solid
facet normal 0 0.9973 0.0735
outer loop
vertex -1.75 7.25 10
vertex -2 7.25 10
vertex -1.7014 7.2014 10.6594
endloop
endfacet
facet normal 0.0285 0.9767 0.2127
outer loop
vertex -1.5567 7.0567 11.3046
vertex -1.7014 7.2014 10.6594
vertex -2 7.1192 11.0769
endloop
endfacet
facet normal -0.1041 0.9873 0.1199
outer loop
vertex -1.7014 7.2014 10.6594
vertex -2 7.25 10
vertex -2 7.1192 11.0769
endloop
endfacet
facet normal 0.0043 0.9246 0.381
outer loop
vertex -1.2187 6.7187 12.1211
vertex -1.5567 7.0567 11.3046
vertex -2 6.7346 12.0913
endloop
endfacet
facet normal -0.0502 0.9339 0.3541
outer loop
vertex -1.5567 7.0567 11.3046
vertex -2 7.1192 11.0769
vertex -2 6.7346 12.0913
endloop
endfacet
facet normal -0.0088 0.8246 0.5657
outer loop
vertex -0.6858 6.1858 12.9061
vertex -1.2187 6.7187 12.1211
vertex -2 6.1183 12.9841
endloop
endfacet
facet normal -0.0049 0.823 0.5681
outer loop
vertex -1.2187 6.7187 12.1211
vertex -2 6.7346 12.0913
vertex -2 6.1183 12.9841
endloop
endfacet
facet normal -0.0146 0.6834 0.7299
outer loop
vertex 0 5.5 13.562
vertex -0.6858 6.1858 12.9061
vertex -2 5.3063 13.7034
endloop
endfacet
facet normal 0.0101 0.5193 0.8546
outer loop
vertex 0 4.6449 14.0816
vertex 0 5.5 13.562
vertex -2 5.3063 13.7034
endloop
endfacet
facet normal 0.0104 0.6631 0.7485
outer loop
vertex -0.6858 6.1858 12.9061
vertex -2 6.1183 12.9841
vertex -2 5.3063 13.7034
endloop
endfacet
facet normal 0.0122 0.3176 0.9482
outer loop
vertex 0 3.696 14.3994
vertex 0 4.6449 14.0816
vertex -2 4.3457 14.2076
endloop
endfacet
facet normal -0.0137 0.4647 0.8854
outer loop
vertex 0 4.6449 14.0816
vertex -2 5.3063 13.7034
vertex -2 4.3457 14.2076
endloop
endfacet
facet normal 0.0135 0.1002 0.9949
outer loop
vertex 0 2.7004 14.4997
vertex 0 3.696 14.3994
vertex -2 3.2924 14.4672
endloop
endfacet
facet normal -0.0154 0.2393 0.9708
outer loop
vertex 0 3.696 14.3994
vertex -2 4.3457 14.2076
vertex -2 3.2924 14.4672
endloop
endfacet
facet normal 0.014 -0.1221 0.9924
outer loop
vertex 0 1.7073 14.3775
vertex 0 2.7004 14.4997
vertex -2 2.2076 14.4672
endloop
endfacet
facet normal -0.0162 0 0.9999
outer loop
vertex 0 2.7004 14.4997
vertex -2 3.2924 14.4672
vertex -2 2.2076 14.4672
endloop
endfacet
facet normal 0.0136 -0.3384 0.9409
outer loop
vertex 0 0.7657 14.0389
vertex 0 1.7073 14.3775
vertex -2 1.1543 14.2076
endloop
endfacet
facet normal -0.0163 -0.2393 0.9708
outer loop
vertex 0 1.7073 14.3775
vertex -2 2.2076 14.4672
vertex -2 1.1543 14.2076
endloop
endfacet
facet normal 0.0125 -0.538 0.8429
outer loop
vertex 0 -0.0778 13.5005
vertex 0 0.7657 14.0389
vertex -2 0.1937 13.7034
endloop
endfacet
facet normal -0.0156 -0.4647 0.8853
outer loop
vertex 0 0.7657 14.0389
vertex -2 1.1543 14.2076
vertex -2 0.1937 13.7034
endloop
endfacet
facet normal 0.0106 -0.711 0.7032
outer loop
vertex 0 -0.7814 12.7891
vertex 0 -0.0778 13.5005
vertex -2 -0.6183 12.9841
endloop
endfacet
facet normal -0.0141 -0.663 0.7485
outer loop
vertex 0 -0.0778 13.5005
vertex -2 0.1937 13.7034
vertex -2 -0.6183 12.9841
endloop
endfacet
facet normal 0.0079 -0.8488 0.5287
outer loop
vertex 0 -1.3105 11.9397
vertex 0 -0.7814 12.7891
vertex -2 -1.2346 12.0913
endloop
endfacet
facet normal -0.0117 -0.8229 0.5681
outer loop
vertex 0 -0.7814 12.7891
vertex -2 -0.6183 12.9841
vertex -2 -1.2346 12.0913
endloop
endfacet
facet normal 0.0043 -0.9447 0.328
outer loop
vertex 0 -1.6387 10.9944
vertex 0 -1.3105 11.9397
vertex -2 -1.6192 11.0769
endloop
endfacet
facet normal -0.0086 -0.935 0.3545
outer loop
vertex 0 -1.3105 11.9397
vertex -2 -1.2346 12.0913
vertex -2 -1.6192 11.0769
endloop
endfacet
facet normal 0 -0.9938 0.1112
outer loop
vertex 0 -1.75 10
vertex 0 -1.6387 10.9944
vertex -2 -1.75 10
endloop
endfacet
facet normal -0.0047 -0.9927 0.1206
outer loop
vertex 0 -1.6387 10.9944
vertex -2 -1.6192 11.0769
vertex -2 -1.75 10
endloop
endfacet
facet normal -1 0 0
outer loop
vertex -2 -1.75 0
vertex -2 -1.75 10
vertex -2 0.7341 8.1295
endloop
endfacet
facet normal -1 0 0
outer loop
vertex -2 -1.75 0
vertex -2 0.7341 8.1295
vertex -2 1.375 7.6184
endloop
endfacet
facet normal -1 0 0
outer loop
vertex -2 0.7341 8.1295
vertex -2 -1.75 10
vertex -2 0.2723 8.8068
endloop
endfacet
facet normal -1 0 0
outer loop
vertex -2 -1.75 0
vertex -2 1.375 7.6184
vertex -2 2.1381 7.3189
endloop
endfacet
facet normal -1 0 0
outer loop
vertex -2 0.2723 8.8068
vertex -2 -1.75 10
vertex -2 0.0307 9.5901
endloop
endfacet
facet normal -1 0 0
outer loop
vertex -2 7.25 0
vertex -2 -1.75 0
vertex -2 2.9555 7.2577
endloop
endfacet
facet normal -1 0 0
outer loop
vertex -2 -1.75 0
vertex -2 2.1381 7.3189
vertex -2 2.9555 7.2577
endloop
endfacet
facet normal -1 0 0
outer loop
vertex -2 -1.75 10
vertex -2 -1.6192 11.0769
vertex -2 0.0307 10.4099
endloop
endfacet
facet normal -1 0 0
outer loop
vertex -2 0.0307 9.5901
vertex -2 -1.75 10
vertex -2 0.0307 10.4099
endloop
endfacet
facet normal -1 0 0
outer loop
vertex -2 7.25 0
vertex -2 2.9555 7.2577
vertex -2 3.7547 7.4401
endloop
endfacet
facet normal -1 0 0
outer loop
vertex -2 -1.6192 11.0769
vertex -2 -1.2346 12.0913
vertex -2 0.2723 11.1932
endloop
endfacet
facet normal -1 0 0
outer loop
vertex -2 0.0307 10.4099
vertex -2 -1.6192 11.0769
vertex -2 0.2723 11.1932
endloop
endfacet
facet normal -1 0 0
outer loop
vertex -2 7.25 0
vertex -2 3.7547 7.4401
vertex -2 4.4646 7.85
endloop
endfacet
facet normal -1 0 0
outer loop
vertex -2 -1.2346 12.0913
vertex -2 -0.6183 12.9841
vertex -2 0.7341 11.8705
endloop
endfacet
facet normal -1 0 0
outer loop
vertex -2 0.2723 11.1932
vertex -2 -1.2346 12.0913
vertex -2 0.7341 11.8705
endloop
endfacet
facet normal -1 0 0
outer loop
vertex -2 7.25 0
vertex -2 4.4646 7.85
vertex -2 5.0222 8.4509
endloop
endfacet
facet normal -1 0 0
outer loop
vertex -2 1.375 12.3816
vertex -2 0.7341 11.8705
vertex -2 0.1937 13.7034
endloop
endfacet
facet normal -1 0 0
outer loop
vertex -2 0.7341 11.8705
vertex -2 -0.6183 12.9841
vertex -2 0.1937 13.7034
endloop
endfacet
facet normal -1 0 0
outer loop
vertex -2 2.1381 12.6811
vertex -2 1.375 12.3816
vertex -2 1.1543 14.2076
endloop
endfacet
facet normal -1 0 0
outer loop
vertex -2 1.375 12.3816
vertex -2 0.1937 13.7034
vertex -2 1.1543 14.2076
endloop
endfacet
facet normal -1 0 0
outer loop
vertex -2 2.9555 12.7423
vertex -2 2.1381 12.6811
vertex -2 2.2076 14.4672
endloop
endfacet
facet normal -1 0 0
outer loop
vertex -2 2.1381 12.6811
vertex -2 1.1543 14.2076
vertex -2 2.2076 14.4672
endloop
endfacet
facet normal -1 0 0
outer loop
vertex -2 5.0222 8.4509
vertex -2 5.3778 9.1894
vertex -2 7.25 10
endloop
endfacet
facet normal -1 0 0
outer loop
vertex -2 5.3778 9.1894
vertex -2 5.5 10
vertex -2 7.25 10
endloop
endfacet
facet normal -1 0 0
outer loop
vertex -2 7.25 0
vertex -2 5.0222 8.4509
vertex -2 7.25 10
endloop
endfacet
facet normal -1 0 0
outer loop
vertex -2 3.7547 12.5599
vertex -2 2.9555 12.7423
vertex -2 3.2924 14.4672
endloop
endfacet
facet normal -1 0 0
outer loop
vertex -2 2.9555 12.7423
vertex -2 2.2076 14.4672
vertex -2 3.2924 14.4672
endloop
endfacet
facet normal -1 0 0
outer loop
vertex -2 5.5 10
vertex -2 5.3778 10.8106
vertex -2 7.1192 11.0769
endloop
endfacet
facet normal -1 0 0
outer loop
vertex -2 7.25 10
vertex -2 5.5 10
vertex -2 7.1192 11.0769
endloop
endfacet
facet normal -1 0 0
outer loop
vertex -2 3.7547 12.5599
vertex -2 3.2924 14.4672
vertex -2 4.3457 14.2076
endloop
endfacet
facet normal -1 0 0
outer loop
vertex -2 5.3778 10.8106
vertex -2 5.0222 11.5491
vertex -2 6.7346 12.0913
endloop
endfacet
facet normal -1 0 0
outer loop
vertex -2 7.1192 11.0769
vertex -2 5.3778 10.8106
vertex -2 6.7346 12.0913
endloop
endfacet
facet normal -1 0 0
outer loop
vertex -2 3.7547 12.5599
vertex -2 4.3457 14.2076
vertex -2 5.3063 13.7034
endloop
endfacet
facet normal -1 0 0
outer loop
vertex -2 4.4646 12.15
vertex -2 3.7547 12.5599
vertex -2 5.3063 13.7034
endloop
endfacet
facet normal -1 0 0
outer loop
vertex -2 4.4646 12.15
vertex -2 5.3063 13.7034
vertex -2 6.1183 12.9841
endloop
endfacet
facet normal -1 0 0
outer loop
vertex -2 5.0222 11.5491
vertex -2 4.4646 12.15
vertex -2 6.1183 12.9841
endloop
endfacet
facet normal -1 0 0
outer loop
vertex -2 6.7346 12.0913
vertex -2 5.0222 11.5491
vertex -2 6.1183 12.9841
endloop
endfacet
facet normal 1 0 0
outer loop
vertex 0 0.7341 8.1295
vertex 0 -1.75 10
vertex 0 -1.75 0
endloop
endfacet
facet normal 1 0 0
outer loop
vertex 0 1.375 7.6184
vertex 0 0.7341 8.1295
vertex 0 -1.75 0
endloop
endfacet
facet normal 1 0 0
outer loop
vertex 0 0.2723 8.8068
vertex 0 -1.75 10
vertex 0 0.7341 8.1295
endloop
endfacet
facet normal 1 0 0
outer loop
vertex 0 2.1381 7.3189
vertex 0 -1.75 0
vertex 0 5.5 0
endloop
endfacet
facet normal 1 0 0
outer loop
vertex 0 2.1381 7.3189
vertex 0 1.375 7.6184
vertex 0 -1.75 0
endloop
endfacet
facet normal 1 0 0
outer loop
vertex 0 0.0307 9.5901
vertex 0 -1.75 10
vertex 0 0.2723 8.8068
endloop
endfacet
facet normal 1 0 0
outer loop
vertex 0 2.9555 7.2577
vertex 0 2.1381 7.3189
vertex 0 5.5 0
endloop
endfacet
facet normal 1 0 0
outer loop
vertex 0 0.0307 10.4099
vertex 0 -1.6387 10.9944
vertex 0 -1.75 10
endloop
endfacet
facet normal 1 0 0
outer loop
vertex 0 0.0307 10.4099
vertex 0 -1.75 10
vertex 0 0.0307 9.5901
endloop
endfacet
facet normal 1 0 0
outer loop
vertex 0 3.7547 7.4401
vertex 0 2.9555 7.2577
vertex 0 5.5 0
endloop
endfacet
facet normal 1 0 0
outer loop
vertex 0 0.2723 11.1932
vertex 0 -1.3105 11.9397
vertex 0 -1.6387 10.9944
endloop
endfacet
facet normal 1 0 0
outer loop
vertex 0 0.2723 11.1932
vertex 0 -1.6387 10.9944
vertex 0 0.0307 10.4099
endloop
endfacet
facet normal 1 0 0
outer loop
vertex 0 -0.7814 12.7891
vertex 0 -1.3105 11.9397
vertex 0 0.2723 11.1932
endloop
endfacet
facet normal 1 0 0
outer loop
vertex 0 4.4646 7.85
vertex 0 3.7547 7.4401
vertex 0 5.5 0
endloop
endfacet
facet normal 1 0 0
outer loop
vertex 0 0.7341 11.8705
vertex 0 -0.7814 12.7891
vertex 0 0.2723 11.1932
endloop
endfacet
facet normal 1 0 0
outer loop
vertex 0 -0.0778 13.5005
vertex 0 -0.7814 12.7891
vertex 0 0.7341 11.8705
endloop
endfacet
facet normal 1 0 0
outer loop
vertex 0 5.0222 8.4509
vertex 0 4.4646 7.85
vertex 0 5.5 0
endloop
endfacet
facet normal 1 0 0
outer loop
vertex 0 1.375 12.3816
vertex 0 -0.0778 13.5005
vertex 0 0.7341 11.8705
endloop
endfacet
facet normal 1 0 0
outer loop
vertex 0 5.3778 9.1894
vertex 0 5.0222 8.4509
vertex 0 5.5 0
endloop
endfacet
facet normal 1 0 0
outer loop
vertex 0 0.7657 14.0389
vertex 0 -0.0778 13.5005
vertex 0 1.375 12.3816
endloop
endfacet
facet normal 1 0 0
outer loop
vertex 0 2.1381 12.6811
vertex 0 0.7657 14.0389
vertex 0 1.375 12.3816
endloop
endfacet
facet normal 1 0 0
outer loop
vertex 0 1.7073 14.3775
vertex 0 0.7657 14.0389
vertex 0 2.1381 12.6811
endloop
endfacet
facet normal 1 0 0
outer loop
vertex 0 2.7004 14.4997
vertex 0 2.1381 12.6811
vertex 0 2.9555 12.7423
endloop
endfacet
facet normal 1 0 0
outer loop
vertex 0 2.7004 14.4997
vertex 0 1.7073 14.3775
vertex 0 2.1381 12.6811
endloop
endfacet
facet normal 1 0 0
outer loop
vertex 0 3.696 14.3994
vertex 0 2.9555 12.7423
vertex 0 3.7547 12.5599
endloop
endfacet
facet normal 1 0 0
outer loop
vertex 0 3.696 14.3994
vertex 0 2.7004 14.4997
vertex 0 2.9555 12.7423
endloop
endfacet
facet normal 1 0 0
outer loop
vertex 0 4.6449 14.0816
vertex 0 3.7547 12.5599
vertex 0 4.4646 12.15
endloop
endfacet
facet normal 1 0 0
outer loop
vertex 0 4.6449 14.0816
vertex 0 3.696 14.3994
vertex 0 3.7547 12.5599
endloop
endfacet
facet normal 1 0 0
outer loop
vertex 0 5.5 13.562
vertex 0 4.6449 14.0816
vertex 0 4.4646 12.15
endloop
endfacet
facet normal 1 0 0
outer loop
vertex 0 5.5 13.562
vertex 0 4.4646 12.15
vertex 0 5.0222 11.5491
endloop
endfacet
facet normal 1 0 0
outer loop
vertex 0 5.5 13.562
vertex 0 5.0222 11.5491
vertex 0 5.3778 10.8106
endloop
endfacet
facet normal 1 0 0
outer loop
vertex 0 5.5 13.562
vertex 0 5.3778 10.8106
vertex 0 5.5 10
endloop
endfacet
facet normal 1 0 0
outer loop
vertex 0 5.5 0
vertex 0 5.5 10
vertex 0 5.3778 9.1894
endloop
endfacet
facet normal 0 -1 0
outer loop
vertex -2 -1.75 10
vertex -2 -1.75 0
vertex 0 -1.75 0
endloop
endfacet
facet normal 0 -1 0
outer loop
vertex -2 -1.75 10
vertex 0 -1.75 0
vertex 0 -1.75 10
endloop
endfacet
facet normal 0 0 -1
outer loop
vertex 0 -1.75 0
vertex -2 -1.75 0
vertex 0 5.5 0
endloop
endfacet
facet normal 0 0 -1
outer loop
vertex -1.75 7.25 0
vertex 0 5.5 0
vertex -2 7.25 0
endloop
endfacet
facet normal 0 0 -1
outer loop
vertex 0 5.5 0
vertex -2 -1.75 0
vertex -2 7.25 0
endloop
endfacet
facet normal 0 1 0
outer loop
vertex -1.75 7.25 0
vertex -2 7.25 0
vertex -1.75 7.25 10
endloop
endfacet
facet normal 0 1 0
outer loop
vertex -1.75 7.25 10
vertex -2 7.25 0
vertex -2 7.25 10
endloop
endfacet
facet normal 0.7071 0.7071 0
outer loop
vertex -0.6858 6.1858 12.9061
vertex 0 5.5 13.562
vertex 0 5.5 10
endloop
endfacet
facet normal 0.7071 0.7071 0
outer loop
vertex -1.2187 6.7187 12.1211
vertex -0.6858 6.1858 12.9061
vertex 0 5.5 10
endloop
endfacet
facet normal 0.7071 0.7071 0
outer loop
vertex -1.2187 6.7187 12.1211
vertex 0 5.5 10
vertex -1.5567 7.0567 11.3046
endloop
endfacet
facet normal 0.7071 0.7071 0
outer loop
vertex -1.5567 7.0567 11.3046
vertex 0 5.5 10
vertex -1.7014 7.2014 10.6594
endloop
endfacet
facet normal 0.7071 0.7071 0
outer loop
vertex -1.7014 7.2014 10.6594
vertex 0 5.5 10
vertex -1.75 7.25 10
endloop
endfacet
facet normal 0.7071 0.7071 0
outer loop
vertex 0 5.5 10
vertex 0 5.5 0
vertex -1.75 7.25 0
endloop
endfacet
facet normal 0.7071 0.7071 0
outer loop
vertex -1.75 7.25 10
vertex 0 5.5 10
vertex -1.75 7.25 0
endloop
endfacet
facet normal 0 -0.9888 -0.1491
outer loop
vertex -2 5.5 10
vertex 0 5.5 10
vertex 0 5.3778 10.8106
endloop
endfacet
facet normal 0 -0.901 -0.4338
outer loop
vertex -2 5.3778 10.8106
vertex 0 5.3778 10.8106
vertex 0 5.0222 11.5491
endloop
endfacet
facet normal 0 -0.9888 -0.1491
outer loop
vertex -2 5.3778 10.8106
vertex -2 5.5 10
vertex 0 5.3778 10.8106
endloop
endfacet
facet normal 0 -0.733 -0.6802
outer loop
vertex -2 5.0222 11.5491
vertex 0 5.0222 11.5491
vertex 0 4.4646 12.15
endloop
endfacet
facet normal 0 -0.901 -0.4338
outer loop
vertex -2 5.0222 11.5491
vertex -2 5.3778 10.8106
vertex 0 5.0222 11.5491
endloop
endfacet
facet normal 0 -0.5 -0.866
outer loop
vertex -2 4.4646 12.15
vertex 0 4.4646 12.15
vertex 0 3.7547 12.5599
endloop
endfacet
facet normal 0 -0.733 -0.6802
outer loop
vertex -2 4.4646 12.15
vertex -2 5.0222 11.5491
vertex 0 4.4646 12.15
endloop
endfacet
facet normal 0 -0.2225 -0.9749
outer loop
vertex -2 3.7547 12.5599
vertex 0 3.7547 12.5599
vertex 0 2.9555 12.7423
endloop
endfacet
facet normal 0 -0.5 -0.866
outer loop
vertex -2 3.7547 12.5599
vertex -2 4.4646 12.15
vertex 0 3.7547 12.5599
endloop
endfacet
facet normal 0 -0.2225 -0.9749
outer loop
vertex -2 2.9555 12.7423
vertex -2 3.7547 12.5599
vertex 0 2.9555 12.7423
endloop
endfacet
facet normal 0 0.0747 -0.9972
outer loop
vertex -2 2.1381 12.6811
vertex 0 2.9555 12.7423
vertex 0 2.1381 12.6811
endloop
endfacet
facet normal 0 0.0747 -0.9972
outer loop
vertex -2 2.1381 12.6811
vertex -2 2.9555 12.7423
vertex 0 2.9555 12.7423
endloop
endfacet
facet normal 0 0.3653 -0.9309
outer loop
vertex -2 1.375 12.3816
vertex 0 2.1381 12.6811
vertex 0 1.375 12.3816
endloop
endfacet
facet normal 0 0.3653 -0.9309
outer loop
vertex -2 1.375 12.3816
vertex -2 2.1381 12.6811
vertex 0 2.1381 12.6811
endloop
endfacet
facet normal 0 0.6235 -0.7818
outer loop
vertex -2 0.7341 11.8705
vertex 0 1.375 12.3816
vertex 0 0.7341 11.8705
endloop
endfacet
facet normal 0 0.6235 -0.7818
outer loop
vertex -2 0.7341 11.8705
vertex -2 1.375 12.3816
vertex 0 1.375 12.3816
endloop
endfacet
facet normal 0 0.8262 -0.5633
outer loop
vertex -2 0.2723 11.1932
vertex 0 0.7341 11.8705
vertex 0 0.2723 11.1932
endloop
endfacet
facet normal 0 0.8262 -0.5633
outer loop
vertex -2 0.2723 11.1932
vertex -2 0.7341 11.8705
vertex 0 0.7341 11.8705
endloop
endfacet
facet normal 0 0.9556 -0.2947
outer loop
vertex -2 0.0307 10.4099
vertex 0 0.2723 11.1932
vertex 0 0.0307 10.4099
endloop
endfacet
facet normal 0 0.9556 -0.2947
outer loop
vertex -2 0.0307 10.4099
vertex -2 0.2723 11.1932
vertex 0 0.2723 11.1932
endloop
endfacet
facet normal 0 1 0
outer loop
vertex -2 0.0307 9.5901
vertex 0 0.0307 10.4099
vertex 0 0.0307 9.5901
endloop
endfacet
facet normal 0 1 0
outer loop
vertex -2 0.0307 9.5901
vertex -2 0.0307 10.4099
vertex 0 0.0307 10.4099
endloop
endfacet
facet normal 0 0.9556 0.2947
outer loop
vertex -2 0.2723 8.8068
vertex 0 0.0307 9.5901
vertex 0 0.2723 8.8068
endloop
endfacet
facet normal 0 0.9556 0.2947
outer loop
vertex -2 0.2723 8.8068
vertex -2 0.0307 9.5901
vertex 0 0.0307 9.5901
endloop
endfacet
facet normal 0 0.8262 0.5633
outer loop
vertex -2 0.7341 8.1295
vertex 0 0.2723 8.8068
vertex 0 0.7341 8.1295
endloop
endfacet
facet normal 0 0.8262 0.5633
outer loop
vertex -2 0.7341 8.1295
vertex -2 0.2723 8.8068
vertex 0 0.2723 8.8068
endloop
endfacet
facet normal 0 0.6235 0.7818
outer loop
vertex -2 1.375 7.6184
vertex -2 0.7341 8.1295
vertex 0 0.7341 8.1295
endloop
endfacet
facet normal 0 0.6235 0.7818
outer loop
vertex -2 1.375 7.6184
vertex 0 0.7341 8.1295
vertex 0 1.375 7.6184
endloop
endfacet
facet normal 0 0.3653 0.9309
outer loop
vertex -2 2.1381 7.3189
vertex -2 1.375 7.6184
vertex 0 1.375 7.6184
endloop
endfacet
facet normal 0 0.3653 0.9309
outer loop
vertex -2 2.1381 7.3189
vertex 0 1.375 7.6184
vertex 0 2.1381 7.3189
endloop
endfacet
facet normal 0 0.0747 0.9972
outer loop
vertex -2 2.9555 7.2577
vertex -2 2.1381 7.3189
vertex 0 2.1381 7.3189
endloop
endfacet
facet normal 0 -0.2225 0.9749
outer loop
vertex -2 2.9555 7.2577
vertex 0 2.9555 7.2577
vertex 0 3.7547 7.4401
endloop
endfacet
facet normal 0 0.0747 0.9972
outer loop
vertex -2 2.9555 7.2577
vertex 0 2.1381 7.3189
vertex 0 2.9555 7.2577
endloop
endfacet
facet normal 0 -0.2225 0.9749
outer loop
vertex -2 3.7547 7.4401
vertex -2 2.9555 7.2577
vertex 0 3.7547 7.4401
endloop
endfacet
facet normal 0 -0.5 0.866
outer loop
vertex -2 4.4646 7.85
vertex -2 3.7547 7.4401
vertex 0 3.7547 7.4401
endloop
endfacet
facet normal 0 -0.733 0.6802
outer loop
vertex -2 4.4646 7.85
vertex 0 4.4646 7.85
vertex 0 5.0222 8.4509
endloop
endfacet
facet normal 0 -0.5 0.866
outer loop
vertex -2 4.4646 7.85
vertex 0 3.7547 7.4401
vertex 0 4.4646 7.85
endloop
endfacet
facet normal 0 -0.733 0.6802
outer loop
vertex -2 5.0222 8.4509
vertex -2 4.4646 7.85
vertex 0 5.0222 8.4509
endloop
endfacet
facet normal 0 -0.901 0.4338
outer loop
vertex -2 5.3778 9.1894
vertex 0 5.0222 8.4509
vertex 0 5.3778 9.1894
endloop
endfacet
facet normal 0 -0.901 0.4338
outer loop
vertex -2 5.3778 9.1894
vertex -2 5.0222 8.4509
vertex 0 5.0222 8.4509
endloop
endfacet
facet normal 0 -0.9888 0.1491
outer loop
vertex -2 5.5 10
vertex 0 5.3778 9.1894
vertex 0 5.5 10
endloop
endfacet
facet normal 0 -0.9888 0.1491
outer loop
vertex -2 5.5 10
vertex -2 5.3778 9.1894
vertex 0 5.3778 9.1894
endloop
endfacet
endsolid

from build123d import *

# Parameters (mm, degrees)
SKETCH106_R      = 2.75
EXTRUDE024_DEPTH = 5
EXTRUDE023_DEPTH = 15
EXTRUDE022_DEPTH = 2


with BuildPart() as extrude024:
    # Sketch106 → Extrude024 (new body)
    with BuildSketch(Plane.YZ.offset(-2)):
        with Locations((2.75, 10)):
            Circle(SKETCH106_R)
    extrude(amount=EXTRUDE024_DEPTH)


with BuildPart() as extrude023:
    # Sketch105 → Extrude023 (new body)
    with BuildSketch(Plane.XY):
        Polygon((0, 5.5), (-1.75, 7.25), (0, 7.25), align=None)
    extrude(amount=EXTRUDE023_DEPTH)


with BuildPart() as cut019:
    # Sketch104 → Extrude022 (new body)
    with BuildSketch(Plane.YZ.offset(-2)):
        with BuildLine():
            Line((-1.75, 0), (7.25, 0))
            Line((7.25, 0), (7.25, 10))
            ThreePointArc((7.25, 10), (2.749999, 14.5), (-1.75, 9.999998))
            Line((-1.75, 0), (-1.75, 9.999998))
        make_face()
    extrude(amount=EXTRUDE022_DEPTH)

    # Cut018: cut Extrude023
    add(extrude023.part, mode=Mode.SUBTRACT)

    # Cut019: cut Extrude024
    add(extrude024.part, mode=Mode.SUBTRACT)


solid = cut019.part
